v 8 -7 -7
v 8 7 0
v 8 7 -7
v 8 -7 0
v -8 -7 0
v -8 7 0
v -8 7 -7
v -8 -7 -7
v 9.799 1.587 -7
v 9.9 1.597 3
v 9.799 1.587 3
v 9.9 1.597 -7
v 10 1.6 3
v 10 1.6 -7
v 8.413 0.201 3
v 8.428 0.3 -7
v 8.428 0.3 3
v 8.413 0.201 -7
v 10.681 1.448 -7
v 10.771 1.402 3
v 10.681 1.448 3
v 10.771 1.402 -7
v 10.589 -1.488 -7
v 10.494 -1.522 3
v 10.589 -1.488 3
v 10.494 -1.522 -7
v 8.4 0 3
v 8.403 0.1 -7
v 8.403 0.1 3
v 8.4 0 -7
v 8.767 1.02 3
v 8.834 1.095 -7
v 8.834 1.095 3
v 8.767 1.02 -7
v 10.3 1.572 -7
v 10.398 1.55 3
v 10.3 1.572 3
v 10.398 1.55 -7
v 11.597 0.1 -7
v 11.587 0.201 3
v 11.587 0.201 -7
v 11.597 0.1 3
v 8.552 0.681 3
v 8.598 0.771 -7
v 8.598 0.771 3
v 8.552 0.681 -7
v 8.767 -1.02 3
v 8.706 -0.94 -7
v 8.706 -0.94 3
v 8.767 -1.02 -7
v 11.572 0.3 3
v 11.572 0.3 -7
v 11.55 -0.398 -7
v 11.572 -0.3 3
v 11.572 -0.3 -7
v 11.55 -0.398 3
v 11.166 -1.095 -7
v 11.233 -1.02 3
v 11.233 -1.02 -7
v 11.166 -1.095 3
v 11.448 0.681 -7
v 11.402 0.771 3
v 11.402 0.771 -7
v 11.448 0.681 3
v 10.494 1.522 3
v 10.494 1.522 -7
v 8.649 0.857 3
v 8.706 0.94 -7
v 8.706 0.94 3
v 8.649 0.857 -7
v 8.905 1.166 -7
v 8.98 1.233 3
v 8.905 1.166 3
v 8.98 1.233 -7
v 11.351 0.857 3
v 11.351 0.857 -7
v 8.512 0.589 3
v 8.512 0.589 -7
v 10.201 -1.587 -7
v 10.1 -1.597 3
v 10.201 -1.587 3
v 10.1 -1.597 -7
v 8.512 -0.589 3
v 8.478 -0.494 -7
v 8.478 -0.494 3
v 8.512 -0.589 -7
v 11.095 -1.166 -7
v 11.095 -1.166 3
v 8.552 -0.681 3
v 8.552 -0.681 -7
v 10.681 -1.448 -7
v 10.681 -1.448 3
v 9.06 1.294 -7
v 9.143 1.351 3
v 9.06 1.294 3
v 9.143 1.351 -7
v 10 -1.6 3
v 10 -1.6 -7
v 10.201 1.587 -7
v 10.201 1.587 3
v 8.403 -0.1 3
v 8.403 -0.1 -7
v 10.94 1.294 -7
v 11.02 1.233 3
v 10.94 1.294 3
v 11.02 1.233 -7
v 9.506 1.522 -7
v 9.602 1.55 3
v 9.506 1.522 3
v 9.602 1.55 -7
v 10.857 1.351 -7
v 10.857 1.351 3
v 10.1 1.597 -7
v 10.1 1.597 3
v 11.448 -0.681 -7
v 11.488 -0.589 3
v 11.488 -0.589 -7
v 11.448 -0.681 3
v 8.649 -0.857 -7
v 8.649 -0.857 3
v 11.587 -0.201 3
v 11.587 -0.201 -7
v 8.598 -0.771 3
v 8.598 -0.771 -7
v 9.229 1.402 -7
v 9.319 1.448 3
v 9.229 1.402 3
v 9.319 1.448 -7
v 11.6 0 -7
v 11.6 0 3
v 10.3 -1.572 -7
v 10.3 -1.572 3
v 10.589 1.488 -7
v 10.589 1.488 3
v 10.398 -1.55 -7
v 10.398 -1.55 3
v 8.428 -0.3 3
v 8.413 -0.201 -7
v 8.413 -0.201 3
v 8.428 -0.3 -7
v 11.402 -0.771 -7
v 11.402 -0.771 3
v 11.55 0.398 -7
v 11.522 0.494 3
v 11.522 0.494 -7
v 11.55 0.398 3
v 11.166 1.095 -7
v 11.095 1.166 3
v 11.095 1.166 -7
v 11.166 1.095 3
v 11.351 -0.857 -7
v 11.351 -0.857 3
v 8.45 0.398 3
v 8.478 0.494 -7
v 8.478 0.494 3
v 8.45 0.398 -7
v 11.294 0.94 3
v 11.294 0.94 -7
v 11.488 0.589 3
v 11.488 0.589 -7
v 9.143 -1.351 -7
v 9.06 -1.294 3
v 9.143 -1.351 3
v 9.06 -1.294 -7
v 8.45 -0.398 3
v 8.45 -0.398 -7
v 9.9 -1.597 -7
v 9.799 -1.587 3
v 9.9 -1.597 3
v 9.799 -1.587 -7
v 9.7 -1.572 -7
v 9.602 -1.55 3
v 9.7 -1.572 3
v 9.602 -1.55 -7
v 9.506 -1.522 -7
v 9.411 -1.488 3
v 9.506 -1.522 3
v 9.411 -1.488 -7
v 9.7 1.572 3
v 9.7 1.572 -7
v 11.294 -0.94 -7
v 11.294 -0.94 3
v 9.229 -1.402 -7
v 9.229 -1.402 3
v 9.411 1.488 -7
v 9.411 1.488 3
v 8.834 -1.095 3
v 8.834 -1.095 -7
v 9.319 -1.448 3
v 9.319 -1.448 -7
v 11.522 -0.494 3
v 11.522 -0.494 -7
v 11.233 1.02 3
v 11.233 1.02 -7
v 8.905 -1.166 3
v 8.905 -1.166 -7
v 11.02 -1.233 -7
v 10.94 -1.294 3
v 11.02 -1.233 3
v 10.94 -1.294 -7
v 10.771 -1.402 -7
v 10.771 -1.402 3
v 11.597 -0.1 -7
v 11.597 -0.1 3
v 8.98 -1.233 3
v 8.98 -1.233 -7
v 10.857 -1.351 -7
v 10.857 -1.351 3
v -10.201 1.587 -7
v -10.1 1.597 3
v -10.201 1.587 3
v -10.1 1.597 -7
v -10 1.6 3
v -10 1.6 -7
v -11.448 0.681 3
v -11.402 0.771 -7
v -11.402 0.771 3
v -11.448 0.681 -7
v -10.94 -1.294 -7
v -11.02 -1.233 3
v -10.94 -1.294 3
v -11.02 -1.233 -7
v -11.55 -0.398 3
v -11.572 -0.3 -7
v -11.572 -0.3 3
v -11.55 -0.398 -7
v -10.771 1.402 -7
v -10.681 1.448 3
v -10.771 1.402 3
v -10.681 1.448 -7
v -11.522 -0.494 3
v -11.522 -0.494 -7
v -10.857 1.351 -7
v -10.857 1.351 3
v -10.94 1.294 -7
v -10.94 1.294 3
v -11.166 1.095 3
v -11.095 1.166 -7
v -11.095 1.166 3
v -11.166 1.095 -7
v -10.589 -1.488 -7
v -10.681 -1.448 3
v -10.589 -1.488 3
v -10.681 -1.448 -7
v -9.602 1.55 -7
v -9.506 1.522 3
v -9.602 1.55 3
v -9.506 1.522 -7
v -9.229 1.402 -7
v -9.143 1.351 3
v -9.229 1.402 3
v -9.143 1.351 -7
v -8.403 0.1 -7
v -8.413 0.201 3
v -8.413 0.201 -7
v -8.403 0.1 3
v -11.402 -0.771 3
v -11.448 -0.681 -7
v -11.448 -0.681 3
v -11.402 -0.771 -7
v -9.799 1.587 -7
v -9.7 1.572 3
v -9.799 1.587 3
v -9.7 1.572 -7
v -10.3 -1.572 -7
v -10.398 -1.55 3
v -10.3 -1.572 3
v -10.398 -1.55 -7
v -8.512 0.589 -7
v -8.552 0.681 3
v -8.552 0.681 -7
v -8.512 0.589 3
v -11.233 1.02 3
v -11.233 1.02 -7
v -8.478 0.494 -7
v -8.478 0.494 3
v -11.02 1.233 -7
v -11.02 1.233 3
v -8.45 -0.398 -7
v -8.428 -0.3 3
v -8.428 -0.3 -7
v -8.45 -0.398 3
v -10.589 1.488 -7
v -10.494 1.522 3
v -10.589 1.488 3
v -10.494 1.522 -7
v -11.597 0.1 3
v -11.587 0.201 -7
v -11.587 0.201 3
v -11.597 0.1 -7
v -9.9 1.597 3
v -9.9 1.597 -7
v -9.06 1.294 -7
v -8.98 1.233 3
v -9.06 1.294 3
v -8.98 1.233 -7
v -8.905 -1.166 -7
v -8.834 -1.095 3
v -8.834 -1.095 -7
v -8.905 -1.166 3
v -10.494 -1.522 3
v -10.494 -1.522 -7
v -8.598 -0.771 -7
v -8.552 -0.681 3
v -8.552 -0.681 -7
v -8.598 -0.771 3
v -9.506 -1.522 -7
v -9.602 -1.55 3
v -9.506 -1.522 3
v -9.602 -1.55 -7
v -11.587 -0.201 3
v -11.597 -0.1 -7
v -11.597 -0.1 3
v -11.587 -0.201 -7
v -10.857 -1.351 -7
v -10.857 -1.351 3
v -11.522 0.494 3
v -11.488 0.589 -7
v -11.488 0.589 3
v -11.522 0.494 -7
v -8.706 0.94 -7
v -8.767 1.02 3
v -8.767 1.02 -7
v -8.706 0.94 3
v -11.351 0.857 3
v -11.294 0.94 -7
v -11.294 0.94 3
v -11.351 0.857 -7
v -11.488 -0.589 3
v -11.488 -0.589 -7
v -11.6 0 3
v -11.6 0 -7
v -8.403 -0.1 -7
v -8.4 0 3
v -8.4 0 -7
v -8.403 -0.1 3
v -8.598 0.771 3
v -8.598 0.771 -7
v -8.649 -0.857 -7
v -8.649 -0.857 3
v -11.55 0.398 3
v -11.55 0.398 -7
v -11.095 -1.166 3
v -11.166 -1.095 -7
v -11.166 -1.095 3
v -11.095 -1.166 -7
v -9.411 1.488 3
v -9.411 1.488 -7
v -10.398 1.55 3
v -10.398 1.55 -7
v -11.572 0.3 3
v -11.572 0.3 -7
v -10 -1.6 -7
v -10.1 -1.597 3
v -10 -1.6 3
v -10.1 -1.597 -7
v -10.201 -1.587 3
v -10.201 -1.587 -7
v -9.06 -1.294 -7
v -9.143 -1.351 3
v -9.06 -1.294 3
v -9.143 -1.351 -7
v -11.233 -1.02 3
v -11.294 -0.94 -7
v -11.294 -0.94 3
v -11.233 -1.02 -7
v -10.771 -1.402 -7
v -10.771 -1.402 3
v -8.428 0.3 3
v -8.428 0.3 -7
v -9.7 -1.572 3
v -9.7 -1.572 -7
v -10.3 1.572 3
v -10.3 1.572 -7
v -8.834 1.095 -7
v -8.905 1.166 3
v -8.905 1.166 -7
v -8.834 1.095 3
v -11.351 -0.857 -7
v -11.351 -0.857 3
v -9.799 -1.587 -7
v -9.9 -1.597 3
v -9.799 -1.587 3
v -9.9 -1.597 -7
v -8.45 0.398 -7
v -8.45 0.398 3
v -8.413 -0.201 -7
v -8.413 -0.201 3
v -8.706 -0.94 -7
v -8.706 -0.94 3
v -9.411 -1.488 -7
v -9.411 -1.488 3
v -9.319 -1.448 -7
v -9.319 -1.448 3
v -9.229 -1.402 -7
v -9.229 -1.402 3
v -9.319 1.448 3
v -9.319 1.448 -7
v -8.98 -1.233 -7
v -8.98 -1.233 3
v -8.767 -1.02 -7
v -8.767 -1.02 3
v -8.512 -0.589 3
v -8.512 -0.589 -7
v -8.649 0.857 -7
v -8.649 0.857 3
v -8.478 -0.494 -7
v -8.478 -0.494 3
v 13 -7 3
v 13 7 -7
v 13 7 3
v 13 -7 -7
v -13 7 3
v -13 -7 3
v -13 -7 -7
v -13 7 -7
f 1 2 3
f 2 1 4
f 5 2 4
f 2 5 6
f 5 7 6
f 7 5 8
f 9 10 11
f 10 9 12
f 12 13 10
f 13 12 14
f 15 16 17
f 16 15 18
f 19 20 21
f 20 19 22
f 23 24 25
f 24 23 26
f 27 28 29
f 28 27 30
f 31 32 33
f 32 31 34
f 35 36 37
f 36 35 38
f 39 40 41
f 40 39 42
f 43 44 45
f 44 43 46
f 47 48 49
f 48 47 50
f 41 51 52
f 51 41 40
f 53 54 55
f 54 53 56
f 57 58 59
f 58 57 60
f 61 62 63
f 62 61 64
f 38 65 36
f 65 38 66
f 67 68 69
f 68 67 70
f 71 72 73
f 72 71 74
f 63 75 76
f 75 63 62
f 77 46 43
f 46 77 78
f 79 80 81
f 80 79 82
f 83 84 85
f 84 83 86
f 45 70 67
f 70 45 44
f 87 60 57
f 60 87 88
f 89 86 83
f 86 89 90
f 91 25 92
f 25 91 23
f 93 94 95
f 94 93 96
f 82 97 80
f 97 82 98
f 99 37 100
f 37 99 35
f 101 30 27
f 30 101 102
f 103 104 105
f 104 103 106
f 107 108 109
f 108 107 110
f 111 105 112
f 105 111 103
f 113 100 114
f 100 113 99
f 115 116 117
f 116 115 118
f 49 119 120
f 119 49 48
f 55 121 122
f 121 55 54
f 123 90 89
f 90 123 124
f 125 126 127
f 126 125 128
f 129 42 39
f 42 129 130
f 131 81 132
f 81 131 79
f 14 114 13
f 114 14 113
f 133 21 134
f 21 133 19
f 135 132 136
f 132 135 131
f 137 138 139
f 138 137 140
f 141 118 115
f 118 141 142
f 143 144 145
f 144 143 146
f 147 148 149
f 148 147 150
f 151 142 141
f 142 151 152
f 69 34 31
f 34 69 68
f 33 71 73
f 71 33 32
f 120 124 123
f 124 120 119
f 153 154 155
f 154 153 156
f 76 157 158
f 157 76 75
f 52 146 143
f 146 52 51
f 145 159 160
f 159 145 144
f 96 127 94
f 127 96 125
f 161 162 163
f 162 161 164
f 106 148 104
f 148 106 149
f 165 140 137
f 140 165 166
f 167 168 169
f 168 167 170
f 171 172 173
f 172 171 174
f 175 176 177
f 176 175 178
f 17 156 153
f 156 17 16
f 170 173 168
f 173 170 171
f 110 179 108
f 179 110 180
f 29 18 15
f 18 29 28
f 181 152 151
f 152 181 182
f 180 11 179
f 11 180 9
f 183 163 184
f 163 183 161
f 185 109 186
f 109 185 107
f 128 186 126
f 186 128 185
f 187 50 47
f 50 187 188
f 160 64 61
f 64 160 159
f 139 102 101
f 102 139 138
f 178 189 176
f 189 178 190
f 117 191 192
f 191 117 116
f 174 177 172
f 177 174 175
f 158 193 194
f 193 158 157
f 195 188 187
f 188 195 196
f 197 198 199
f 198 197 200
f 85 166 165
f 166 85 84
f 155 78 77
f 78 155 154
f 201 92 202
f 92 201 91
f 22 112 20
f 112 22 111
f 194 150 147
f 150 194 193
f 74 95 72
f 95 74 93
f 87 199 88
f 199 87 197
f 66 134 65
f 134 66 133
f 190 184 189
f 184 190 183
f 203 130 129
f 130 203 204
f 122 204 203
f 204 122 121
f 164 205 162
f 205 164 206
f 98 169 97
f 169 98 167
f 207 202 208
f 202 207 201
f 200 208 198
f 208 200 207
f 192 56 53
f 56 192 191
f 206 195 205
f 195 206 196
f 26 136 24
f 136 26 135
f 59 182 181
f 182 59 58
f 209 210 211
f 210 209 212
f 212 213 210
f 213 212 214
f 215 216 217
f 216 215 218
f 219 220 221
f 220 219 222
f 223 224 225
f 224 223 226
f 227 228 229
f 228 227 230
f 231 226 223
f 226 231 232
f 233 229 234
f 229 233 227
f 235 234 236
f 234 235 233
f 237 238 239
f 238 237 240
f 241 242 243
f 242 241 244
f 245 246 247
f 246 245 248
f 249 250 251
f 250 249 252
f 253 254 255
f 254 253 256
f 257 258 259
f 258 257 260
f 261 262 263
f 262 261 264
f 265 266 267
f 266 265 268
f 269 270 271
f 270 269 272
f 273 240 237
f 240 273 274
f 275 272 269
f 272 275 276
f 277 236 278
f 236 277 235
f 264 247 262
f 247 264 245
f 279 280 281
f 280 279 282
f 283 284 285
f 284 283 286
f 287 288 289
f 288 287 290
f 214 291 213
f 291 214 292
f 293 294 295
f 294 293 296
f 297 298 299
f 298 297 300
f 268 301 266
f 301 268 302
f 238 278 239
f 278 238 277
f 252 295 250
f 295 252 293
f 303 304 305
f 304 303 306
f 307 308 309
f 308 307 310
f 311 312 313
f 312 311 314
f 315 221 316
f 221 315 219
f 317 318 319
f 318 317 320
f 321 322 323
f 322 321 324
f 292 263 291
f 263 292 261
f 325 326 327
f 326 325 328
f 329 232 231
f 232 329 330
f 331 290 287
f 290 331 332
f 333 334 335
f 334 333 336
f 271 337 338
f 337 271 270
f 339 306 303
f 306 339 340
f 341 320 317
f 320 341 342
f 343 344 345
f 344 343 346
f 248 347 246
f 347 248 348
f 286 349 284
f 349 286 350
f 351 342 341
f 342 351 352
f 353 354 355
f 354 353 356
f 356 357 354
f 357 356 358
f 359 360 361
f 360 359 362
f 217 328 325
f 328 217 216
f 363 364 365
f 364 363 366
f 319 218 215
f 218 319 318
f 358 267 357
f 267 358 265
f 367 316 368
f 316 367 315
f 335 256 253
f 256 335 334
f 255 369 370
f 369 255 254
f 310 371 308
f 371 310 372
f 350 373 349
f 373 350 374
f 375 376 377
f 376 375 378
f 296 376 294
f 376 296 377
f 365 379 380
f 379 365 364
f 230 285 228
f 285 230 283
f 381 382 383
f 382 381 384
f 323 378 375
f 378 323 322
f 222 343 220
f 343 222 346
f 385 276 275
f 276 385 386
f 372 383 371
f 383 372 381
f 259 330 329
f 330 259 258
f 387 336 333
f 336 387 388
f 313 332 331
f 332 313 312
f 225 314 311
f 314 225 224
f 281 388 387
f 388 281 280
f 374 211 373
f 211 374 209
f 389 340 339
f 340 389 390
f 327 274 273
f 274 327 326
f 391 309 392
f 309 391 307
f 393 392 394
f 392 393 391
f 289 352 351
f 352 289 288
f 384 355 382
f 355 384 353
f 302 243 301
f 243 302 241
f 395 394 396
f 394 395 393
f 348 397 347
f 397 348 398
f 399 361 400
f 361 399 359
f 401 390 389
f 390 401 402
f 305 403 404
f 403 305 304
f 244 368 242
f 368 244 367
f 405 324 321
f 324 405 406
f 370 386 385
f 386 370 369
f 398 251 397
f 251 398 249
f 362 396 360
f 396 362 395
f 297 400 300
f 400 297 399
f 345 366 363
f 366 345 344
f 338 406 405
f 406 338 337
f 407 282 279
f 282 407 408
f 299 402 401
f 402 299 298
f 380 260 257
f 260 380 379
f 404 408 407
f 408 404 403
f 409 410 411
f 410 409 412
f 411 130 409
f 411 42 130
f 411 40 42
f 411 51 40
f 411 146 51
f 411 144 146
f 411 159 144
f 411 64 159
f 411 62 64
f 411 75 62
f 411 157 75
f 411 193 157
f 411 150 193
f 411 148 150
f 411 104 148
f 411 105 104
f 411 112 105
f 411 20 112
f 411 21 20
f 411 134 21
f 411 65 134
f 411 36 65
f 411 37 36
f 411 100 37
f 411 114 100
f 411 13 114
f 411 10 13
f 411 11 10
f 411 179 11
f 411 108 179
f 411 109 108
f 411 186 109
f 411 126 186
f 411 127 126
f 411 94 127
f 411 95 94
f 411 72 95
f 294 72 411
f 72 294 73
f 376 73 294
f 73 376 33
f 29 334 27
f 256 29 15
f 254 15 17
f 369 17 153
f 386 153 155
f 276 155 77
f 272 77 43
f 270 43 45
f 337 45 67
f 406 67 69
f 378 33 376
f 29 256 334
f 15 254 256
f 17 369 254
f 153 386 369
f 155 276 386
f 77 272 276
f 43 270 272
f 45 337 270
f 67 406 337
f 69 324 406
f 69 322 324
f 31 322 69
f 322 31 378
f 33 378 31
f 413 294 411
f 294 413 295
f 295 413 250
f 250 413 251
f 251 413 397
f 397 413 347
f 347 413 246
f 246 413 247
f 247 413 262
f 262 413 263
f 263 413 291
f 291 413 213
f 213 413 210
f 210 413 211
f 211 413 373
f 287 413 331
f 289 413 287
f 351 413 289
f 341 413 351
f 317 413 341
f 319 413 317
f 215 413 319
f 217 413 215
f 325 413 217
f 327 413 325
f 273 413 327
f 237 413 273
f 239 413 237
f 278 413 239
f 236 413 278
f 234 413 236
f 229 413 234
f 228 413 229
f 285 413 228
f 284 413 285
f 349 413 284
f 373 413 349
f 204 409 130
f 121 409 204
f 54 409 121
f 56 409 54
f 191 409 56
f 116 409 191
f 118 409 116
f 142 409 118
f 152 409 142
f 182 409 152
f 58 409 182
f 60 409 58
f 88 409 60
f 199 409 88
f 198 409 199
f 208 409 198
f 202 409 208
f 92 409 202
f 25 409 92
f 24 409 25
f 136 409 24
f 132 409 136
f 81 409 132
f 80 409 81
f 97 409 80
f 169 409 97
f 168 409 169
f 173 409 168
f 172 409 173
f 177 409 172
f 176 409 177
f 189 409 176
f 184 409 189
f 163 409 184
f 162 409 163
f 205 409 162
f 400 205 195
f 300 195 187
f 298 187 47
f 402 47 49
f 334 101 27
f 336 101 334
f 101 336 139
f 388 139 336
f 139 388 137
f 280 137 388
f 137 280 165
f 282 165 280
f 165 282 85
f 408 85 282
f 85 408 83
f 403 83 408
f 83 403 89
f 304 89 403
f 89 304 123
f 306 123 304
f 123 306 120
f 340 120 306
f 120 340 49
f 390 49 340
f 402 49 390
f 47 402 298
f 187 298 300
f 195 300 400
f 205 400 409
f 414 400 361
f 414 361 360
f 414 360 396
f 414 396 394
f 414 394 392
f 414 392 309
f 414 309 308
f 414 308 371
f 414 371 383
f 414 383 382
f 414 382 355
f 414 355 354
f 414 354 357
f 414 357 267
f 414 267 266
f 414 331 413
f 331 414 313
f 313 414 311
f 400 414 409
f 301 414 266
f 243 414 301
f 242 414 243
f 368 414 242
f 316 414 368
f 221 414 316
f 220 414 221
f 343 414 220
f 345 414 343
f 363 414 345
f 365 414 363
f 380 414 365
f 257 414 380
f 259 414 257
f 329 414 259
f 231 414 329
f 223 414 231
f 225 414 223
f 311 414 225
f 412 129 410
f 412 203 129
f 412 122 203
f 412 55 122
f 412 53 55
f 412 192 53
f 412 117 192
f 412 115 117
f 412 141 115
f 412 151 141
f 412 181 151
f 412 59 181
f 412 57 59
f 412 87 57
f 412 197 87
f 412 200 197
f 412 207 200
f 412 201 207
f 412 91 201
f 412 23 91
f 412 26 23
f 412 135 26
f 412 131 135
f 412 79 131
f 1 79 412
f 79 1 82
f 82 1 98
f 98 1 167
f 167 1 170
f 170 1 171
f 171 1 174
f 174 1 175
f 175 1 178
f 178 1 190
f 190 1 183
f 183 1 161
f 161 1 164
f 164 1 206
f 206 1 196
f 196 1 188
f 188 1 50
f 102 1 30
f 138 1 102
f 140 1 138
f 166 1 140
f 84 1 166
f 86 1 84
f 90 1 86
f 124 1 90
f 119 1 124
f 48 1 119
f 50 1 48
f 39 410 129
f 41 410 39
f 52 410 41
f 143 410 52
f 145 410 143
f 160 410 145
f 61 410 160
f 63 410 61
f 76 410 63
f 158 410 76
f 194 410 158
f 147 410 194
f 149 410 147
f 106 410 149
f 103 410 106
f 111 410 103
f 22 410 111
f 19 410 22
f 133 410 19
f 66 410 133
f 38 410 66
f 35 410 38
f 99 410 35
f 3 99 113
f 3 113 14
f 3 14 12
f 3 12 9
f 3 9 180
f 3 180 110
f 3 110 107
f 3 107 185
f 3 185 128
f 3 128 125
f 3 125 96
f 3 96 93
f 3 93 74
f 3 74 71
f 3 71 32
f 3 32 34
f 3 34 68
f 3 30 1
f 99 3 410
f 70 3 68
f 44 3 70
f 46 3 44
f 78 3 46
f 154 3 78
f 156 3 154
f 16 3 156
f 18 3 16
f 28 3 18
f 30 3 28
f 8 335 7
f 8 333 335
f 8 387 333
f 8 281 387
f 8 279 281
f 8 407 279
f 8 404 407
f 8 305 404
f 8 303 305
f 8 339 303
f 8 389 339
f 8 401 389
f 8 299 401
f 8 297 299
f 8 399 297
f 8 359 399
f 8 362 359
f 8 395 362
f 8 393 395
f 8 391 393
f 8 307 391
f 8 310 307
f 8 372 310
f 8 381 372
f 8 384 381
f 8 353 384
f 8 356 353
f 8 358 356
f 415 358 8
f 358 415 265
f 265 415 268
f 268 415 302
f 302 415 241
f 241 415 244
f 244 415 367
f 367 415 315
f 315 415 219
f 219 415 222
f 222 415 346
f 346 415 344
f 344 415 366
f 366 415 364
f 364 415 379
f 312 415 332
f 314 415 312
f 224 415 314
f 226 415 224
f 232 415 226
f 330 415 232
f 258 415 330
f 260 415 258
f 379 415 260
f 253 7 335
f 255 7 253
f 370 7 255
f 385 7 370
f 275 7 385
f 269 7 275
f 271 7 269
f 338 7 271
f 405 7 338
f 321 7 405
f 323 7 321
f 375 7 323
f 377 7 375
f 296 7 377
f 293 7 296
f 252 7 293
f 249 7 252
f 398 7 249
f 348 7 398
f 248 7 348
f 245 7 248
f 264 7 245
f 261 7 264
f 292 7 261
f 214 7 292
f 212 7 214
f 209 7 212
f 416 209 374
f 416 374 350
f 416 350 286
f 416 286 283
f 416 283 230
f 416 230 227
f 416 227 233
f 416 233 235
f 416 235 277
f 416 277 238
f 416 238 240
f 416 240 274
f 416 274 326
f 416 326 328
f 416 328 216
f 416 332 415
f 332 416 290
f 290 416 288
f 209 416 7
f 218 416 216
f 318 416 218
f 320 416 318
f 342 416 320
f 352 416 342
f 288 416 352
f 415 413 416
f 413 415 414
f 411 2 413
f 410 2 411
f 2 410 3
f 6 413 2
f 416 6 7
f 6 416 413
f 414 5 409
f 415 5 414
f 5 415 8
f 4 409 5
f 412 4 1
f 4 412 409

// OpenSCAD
translate([0,-7,-7]){


        difference(){
            union(){

                translate([-13,0,0]){
                    cube([26,14,10], center=false);
                }      

            }
            union() {
                translate([-8,-1,-1]){
                    cube([16,16,8], center=false);
                }      

                translate([10,7,-1]){
                    rotate([0,0,90]){
                        cylinder(h=33, r=1.6, $fn=100, center=false);
                    }
                }  
                translate([-10,7,-1]){
                    rotate([0,0,90]){
                        cylinder(h=33, r=1.6, $fn=100, center=false);
                    }
                }  


            }
        }
}
